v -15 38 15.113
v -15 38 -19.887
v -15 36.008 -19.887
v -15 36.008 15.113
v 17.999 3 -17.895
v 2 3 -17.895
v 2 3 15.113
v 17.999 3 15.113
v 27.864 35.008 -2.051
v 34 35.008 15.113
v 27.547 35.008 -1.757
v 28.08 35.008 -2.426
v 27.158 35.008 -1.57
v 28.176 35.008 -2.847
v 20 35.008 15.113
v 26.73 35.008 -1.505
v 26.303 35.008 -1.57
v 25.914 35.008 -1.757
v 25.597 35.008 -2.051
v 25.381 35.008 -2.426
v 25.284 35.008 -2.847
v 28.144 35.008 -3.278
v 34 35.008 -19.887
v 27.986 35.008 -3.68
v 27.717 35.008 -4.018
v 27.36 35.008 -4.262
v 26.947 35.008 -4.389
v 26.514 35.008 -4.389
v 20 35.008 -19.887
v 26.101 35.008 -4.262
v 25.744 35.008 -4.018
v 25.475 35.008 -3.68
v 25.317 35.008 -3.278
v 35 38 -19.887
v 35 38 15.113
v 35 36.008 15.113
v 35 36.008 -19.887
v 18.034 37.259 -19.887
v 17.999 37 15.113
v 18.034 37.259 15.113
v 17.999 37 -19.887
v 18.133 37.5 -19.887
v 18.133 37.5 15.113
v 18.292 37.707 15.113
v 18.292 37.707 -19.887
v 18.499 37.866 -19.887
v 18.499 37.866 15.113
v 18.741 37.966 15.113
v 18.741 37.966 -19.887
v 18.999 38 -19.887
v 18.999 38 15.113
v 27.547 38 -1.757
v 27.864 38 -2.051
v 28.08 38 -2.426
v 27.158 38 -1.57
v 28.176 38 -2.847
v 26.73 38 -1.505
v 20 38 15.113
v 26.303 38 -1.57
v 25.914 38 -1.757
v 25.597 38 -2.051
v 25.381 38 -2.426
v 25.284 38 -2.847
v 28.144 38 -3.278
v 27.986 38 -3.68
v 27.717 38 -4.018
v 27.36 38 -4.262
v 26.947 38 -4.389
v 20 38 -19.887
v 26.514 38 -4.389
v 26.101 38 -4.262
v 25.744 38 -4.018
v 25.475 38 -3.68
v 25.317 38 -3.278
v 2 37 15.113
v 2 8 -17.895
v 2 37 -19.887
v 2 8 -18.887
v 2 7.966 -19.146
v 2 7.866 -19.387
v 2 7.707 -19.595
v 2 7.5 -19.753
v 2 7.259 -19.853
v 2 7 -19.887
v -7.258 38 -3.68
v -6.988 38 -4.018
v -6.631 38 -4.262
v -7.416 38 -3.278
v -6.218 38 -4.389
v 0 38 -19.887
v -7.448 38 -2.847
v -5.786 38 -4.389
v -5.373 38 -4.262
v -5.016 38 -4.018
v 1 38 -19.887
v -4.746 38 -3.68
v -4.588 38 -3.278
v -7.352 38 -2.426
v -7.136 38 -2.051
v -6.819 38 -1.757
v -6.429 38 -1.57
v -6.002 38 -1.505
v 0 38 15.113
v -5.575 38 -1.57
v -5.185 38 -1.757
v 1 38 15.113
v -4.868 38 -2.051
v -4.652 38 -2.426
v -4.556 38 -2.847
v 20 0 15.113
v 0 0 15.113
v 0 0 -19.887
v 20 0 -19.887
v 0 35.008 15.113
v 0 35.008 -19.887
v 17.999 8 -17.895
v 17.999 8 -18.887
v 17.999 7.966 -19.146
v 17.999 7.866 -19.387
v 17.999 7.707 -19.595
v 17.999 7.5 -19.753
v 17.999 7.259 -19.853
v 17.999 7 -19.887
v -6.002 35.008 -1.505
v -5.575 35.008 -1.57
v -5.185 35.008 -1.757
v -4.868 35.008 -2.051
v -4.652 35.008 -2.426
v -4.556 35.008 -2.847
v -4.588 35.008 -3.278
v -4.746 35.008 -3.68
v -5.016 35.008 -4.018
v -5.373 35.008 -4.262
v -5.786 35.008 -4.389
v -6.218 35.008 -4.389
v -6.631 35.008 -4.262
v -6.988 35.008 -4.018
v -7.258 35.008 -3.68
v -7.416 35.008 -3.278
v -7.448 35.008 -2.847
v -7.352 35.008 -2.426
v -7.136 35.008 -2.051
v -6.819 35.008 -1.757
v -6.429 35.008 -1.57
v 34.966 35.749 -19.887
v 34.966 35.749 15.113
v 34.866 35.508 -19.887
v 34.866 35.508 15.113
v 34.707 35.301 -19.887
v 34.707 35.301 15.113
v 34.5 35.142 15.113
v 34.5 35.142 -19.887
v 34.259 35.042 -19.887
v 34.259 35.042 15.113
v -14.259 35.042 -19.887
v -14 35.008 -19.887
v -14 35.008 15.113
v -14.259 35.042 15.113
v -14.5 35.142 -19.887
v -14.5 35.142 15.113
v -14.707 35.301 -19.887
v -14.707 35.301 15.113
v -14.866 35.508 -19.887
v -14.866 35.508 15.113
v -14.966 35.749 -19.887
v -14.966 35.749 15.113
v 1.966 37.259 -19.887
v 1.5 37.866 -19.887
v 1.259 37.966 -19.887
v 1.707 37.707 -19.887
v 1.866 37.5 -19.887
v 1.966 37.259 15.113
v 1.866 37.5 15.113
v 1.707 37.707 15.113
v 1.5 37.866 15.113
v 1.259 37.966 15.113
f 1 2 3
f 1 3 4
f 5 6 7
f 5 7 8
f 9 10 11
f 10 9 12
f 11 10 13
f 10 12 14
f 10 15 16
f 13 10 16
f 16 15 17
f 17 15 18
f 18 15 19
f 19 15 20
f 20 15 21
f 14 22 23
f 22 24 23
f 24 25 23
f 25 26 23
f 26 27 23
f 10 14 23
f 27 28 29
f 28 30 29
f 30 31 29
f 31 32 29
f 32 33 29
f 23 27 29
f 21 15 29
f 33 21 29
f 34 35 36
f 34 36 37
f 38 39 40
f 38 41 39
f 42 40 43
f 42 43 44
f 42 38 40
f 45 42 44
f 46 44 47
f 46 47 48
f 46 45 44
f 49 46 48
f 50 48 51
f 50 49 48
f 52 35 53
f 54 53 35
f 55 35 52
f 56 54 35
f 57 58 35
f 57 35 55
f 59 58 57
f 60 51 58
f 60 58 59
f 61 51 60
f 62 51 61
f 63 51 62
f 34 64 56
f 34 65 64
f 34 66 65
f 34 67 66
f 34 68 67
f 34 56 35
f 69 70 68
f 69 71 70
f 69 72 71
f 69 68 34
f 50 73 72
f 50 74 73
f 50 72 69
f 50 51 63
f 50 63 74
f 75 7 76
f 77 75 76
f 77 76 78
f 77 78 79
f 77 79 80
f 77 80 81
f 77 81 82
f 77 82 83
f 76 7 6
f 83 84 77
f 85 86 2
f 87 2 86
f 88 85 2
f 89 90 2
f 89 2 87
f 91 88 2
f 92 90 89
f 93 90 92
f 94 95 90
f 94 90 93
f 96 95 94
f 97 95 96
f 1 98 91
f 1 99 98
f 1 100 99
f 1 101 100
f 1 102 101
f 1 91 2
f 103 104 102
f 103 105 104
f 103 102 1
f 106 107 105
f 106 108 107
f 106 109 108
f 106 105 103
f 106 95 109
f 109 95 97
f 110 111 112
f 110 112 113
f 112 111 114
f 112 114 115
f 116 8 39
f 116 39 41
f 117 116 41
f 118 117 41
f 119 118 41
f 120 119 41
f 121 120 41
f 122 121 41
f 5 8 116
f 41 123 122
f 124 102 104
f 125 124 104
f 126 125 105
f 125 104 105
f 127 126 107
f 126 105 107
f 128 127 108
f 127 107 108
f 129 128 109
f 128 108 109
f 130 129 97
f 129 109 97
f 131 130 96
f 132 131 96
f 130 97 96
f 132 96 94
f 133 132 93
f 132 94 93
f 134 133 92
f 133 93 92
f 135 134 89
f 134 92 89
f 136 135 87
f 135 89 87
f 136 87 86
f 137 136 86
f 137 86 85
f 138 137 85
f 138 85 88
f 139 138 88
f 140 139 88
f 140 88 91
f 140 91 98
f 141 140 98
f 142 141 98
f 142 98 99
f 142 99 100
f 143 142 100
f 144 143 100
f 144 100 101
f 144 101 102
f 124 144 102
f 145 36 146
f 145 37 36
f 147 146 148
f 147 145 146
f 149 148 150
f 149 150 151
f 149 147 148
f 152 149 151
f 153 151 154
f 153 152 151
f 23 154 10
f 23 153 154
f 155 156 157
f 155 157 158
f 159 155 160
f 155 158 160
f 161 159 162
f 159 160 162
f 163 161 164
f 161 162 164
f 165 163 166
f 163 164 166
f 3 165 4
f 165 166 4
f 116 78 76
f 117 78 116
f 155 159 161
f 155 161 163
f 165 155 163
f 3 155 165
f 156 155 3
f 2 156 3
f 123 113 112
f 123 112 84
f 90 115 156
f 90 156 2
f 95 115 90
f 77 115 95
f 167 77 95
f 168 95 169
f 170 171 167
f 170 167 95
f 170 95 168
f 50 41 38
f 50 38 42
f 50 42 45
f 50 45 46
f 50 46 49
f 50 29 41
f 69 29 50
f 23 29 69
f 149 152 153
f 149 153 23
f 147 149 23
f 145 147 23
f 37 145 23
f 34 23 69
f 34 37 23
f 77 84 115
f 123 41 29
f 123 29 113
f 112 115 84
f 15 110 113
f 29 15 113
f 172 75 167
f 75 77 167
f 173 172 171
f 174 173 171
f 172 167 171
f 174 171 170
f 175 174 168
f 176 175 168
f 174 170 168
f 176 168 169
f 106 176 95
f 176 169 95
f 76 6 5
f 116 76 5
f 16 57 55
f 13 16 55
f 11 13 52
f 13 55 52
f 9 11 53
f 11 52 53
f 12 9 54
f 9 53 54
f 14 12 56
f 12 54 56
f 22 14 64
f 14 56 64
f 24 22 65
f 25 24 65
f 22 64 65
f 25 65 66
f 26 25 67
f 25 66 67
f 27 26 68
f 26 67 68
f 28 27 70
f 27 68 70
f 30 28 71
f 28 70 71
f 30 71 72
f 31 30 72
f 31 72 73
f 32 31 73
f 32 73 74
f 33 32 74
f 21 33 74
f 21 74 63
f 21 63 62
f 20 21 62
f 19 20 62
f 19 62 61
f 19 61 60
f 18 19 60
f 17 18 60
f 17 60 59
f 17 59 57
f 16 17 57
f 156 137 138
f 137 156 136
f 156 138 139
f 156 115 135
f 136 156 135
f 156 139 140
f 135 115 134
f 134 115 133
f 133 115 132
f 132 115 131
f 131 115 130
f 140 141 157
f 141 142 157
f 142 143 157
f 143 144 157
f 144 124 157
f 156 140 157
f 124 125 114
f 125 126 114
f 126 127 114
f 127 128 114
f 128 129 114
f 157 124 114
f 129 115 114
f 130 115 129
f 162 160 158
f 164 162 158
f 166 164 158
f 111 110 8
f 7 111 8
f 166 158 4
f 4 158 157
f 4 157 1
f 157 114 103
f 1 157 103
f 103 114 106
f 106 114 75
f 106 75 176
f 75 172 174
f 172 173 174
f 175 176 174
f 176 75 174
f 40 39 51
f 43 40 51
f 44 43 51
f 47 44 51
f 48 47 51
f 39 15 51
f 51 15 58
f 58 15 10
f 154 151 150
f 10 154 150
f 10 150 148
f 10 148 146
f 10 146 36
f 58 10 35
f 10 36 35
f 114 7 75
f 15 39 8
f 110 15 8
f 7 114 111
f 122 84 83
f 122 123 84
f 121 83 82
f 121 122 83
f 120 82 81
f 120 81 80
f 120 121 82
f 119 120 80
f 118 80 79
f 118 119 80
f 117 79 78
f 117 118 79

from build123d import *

# Parameters (mm, degrees)
SKETCH2_W           = 20
SKETCH2_H           = 35
BOSS_EXTRUDE1_DEPTH = 3
SKETCH3_W           = 2
SKETCH3_H           = 35
SKETCH3_W_2         = 2.000552232
BOSS_EXTRUDE2_DEPTH = 35
SKETCH4_W           = 35
SKETCH4_H           = 2.991859995
BOSS_EXTRUDE3_DEPTH = 15
SKETCH5_W           = 35
SKETCH5_H           = 2.991859995
BOSS_EXTRUDE4_DEPTH = 15
SKETCH6_W           = 15.999447768
SKETCH6_H           = 1.992266861
BOSS_EXTRUDE5_DEPTH = 5
SKETCH8_R           = 1.45
CUT_EXTRUDE1_DEPTH  = 56.358026135
FILLET1_R           = 1
FILLET3_R           = 1


with BuildPart() as part:
    # Sketch2 → Boss-Extrude1 (new body)
    with BuildSketch(Plane(origin=(0, 0, 0), x_dir=(1, 0, 0), z_dir=(0, 1, 0))):
        with Locations((10, 2.387459807)):
            Rectangle(SKETCH2_W, SKETCH2_H)
    extrude(amount=BOSS_EXTRUDE1_DEPTH)

    # Sketch3 → Boss-Extrude2 (add)
    with BuildSketch(Plane(origin=(0, 3, 0), x_dir=(1, 0, 0), z_dir=(0, 1, 0))):
        with Locations((1, 2.387459807)):
            Rectangle(SKETCH3_W, SKETCH3_H)
        with Locations((18.999723884, 2.387459807)):
            Rectangle(SKETCH3_W_2, SKETCH3_H)
    extrude(amount=BOSS_EXTRUDE2_DEPTH)

    # Sketch4 → Boss-Extrude3 (add)
    with BuildSketch(Plane(origin=(20, 0, 0), x_dir=(0, 0, -1), z_dir=(1, 0, 0))):
        with Locations((2.387459807, 36.504070003)):
            Rectangle(SKETCH4_W, SKETCH4_H)
    extrude(amount=BOSS_EXTRUDE3_DEPTH)

    # Sketch5 → Boss-Extrude4 (add)
    with BuildSketch(Plane.ZY):
        with Locations((-2.387459807, 36.504070003)):
            Rectangle(SKETCH5_W, SKETCH5_H)
    extrude(amount=BOSS_EXTRUDE4_DEPTH)

    # Sketch6 → Boss-Extrude5 (add)
    with BuildSketch(Plane(origin=(0, 3, 0), x_dir=(1, 0, 0), z_dir=(0, 1, 0))):
        with Locations((9.999723884, 18.891326377)):
            Rectangle(SKETCH6_W, SKETCH6_H)
    extrude(amount=BOSS_EXTRUDE5_DEPTH)

    # Sketch8 → Cut-Extrude1 (cut, through all)
    with BuildSketch(Plane(origin=(0, 38, 0), x_dir=(1, 0, 0), z_dir=(0, 1, 0))):
        with Locations(Location((-6.002072166, 2.955493098, 0), (0, 0, 270))):
            Circle(SKETCH8_R)
        with Locations(Location((26.730432143, 2.955493098, 0), (0, 0, 270))):
            Circle(SKETCH8_R)
    extrude(amount=-CUT_EXTRUDE1_DEPTH, mode=Mode.SUBTRACT)

    # Fillet1
    fillet1_edges = [part.edges().sort_by_distance(p)[0] for p in [
        (2, 38, -2.387459807),
        (17.999447768, 38, -2.387459807),
        (35, 35.008140005, -2.387459807),
        (-15, 35.008140005, -2.387459807),
    ]]
    fillet(fillet1_edges, radius=FILLET1_R)

    # Fillet3
    fillet3_edges = [part.edges().sort_by_distance(p)[0] for p in [
        (9.999723884, 8, -19.887459807),
    ]]
    fillet(fillet3_edges, radius=FILLET3_R)


solid = part.part
